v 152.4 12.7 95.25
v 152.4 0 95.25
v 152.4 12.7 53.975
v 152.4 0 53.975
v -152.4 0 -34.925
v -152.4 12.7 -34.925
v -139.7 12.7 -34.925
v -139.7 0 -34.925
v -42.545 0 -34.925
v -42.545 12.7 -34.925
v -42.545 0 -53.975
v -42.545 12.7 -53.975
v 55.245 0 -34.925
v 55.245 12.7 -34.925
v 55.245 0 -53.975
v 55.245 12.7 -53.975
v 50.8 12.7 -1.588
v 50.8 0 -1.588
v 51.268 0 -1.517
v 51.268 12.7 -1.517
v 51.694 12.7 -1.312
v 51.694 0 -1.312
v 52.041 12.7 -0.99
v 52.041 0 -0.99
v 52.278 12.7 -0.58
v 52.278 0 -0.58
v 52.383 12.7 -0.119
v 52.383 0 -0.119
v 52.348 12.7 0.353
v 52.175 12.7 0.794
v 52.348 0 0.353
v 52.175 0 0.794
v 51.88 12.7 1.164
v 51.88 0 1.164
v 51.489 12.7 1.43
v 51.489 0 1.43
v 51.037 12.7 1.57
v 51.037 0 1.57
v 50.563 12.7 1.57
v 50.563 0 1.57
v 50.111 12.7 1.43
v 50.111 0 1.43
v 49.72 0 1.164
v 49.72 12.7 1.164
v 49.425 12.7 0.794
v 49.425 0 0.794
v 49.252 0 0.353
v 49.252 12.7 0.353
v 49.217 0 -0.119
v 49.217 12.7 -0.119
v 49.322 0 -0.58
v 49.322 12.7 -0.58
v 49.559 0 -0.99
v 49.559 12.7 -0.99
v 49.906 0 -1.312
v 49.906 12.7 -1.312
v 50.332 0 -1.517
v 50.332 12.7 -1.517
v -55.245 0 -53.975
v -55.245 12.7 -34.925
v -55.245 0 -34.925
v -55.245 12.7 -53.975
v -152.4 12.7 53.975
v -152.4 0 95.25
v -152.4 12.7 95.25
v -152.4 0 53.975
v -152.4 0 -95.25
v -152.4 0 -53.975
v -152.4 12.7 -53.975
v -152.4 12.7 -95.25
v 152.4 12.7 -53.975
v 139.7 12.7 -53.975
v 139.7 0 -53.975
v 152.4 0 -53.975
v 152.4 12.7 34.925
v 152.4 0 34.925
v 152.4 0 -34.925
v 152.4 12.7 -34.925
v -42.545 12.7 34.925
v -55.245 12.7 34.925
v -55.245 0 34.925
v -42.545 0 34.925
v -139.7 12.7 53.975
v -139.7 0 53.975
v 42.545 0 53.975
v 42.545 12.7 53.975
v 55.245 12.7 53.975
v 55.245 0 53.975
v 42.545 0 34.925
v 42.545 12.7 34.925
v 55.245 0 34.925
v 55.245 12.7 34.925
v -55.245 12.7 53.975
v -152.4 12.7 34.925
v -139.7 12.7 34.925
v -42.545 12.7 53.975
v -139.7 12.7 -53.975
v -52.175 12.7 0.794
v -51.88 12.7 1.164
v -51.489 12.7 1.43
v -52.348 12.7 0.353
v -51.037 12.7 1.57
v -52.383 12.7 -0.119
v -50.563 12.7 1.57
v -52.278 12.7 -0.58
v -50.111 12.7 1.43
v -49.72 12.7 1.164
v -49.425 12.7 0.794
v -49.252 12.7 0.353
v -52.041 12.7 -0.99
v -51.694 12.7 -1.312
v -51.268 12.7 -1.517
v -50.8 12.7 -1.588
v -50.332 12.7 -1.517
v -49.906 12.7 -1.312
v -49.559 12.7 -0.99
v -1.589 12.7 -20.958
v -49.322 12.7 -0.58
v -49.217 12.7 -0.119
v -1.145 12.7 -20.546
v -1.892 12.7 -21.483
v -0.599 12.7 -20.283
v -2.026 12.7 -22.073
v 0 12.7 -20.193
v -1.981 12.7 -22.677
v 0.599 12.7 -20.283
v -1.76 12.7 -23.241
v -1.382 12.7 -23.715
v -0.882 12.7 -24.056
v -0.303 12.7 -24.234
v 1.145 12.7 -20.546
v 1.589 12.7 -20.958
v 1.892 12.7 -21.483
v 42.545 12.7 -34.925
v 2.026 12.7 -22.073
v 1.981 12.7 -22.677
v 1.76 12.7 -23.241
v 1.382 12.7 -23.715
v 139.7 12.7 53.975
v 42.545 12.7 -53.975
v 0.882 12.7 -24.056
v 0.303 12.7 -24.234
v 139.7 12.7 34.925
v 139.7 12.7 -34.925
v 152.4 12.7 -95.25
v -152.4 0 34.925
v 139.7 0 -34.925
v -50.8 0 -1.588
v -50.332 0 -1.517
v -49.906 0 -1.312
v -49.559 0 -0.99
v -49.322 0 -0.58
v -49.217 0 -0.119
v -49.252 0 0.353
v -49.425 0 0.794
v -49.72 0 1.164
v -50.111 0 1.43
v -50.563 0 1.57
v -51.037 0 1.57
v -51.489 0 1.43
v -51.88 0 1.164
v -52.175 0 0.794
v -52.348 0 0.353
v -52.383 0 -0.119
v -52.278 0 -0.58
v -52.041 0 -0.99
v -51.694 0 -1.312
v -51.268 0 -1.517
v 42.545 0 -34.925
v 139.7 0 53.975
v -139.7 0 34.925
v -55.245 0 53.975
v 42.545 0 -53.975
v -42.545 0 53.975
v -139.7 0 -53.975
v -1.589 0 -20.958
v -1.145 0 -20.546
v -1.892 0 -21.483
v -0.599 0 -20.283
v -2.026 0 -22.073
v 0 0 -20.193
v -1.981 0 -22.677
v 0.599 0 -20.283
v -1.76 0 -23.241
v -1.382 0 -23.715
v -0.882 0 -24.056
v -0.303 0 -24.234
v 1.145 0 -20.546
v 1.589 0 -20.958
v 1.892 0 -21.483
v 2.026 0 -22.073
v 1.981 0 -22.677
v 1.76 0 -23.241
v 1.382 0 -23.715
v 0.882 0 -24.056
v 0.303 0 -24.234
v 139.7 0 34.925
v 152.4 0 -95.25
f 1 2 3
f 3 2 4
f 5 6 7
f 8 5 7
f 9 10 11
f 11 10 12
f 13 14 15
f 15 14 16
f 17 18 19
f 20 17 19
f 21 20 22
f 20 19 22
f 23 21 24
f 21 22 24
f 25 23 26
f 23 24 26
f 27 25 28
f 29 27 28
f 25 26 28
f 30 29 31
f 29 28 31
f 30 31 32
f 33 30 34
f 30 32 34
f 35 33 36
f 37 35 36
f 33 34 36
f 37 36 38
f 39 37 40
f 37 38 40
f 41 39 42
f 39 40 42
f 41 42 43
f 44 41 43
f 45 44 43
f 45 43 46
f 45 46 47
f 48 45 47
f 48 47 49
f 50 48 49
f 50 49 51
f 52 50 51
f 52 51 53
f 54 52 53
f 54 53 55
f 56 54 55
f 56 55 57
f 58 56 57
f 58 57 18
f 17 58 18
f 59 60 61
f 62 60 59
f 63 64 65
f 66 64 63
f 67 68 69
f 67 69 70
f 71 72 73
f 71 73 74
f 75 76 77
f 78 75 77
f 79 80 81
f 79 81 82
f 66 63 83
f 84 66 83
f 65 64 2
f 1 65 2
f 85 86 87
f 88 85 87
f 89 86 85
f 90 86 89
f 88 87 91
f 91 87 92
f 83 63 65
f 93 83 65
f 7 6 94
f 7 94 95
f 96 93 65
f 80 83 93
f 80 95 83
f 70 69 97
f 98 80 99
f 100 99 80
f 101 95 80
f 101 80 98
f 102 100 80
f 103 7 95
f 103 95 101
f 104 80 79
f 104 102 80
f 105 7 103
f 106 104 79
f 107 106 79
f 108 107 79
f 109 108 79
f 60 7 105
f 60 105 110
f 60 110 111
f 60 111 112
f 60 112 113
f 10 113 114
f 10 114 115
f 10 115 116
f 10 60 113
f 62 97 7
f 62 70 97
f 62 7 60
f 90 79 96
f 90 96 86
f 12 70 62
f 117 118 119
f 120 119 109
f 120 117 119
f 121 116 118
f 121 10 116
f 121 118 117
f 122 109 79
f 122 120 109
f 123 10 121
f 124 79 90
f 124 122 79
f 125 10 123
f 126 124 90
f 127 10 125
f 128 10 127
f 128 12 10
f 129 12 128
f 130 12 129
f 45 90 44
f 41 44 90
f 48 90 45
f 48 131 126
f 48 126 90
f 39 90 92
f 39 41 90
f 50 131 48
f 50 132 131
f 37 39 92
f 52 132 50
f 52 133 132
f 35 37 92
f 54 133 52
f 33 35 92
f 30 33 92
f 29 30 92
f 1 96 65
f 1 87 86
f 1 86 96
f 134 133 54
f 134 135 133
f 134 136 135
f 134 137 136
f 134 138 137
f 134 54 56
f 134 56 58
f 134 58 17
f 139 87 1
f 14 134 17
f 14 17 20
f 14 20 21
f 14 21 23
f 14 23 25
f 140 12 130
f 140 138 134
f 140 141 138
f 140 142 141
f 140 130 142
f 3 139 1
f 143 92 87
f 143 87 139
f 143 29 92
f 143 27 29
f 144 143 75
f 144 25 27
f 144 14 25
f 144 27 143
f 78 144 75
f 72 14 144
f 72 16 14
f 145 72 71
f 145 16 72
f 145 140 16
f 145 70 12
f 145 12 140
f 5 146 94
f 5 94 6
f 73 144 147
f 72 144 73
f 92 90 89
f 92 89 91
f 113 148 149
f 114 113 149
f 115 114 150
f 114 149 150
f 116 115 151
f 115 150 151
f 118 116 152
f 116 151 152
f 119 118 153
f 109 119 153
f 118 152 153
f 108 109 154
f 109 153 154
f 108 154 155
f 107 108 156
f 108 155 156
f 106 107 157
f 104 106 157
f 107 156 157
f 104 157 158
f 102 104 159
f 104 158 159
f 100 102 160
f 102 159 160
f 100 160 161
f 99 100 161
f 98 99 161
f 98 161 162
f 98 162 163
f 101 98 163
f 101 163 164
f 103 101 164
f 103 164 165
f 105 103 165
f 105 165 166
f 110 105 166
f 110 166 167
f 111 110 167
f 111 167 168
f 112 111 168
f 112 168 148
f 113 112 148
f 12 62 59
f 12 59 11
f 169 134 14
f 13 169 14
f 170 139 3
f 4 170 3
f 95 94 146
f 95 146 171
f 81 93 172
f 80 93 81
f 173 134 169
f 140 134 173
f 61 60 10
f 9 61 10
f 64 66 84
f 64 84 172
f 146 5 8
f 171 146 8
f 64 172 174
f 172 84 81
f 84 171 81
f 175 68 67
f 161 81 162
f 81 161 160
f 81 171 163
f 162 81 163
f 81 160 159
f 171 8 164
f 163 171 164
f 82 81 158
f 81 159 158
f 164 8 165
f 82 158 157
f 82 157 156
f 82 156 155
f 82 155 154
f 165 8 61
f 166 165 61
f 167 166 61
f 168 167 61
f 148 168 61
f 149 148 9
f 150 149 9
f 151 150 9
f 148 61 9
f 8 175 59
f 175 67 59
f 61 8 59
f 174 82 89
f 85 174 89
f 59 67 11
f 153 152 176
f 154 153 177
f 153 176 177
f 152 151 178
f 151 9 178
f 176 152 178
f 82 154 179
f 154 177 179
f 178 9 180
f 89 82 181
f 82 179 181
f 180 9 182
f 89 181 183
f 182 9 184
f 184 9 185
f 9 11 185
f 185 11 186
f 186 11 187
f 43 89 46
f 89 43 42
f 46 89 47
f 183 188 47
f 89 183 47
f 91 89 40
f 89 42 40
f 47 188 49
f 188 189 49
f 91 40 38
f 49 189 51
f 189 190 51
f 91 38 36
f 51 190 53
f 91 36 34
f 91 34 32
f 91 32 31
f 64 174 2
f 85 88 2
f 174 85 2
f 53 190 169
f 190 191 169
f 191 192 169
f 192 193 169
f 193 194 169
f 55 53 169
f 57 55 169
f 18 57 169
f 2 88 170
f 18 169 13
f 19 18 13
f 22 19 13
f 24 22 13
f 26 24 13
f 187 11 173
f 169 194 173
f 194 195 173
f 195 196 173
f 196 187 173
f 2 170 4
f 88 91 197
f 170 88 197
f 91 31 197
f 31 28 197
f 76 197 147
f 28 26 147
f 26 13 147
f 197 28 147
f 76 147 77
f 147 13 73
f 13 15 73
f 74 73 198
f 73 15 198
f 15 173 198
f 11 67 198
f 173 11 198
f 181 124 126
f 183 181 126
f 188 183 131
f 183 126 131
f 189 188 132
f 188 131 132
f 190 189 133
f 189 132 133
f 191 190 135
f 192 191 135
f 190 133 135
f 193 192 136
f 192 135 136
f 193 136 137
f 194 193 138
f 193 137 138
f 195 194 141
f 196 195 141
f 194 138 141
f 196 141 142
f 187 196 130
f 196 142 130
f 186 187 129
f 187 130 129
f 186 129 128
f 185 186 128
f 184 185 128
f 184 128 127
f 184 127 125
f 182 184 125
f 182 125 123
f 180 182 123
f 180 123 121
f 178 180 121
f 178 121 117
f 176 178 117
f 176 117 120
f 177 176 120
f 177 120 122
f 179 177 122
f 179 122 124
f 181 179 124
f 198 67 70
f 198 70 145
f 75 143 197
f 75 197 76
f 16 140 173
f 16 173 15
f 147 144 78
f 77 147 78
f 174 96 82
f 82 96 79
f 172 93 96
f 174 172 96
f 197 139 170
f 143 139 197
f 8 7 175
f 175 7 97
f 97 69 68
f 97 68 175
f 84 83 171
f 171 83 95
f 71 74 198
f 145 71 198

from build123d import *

# Parameters (mm, degrees)
SKETCH1_W          = 304.8
SKETCH1_H          = 190.5
EXTRUDE1_DEPTH     = 12.7
SKETCH2_W          = 12.7
SKETCH2_H          = 19.05
EXTRUDE2_DEPTH     = 181.165514181
SKETCH3_R          = 1.5875
CUT_EXTRUDE1_DEPTH = 181.165514181
SKETCH4_R          = 2.032
CUT_EXTRUDE2_DEPTH = 181.165514181


with BuildPart() as part:
    # Sketch1 → Extrude1 (new body)
    with BuildSketch(Plane(origin=(0, 0, 0), x_dir=(1, 0, 0), z_dir=(0, 1, 0))):
        Rectangle(SKETCH1_W, SKETCH1_H)
    extrude(amount=EXTRUDE1_DEPTH)

    # Sketch2 → Extrude2 (cut, through all)
    with BuildSketch(Plane(origin=(0, 12.7, 0), x_dir=(1, 0, 0), z_dir=(0, 1, 0))):
        with Locations((-48.895, 44.45)):
            Rectangle(SKETCH2_W, SKETCH2_H)
        with Locations((48.895, 44.45)):
            Rectangle(SKETCH2_W, SKETCH2_H)
        with Locations((-48.895, -44.45)):
            Rectangle(SKETCH2_W, SKETCH2_H)
        with Locations((48.895, -44.45)):
            Rectangle(SKETCH2_W, SKETCH2_H)
        with Locations((146.05, 44.45)):
            Rectangle(SKETCH2_W, SKETCH2_H)
        with Locations((-146.05, 44.45)):
            Rectangle(SKETCH2_W, SKETCH2_H)
        with Locations((146.05, -44.45)):
            Rectangle(SKETCH2_W, SKETCH2_H)
        with Locations((-146.05, -44.45)):
            Rectangle(SKETCH2_W, SKETCH2_H)
    extrude(amount=-EXTRUDE2_DEPTH, mode=Mode.SUBTRACT)

    # Sketch3 → Cut-Extrude1 (cut, through all)
    with BuildSketch(Plane.XZ):
        with Locations(Location((50.8, 0, 0), (0, 0, 270))):
            Circle(SKETCH3_R)
        with Locations(Location((-50.8, 0, 0), (0, 0, 270))):
            Circle(SKETCH3_R)
    extrude(amount=-CUT_EXTRUDE1_DEPTH, mode=Mode.SUBTRACT)

    # Sketch4 → Cut-Extrude2 (cut, through all)
    with BuildSketch(Plane(origin=(0, 12.7, 0), x_dir=(1, 0, 0), z_dir=(0, 1, 0))):
        with Locations(Location((0, 22.225, 0), (0, 0, 270))):
            Circle(SKETCH4_R)
    extrude(amount=-CUT_EXTRUDE2_DEPTH, mode=Mode.SUBTRACT)


solid = part.part
